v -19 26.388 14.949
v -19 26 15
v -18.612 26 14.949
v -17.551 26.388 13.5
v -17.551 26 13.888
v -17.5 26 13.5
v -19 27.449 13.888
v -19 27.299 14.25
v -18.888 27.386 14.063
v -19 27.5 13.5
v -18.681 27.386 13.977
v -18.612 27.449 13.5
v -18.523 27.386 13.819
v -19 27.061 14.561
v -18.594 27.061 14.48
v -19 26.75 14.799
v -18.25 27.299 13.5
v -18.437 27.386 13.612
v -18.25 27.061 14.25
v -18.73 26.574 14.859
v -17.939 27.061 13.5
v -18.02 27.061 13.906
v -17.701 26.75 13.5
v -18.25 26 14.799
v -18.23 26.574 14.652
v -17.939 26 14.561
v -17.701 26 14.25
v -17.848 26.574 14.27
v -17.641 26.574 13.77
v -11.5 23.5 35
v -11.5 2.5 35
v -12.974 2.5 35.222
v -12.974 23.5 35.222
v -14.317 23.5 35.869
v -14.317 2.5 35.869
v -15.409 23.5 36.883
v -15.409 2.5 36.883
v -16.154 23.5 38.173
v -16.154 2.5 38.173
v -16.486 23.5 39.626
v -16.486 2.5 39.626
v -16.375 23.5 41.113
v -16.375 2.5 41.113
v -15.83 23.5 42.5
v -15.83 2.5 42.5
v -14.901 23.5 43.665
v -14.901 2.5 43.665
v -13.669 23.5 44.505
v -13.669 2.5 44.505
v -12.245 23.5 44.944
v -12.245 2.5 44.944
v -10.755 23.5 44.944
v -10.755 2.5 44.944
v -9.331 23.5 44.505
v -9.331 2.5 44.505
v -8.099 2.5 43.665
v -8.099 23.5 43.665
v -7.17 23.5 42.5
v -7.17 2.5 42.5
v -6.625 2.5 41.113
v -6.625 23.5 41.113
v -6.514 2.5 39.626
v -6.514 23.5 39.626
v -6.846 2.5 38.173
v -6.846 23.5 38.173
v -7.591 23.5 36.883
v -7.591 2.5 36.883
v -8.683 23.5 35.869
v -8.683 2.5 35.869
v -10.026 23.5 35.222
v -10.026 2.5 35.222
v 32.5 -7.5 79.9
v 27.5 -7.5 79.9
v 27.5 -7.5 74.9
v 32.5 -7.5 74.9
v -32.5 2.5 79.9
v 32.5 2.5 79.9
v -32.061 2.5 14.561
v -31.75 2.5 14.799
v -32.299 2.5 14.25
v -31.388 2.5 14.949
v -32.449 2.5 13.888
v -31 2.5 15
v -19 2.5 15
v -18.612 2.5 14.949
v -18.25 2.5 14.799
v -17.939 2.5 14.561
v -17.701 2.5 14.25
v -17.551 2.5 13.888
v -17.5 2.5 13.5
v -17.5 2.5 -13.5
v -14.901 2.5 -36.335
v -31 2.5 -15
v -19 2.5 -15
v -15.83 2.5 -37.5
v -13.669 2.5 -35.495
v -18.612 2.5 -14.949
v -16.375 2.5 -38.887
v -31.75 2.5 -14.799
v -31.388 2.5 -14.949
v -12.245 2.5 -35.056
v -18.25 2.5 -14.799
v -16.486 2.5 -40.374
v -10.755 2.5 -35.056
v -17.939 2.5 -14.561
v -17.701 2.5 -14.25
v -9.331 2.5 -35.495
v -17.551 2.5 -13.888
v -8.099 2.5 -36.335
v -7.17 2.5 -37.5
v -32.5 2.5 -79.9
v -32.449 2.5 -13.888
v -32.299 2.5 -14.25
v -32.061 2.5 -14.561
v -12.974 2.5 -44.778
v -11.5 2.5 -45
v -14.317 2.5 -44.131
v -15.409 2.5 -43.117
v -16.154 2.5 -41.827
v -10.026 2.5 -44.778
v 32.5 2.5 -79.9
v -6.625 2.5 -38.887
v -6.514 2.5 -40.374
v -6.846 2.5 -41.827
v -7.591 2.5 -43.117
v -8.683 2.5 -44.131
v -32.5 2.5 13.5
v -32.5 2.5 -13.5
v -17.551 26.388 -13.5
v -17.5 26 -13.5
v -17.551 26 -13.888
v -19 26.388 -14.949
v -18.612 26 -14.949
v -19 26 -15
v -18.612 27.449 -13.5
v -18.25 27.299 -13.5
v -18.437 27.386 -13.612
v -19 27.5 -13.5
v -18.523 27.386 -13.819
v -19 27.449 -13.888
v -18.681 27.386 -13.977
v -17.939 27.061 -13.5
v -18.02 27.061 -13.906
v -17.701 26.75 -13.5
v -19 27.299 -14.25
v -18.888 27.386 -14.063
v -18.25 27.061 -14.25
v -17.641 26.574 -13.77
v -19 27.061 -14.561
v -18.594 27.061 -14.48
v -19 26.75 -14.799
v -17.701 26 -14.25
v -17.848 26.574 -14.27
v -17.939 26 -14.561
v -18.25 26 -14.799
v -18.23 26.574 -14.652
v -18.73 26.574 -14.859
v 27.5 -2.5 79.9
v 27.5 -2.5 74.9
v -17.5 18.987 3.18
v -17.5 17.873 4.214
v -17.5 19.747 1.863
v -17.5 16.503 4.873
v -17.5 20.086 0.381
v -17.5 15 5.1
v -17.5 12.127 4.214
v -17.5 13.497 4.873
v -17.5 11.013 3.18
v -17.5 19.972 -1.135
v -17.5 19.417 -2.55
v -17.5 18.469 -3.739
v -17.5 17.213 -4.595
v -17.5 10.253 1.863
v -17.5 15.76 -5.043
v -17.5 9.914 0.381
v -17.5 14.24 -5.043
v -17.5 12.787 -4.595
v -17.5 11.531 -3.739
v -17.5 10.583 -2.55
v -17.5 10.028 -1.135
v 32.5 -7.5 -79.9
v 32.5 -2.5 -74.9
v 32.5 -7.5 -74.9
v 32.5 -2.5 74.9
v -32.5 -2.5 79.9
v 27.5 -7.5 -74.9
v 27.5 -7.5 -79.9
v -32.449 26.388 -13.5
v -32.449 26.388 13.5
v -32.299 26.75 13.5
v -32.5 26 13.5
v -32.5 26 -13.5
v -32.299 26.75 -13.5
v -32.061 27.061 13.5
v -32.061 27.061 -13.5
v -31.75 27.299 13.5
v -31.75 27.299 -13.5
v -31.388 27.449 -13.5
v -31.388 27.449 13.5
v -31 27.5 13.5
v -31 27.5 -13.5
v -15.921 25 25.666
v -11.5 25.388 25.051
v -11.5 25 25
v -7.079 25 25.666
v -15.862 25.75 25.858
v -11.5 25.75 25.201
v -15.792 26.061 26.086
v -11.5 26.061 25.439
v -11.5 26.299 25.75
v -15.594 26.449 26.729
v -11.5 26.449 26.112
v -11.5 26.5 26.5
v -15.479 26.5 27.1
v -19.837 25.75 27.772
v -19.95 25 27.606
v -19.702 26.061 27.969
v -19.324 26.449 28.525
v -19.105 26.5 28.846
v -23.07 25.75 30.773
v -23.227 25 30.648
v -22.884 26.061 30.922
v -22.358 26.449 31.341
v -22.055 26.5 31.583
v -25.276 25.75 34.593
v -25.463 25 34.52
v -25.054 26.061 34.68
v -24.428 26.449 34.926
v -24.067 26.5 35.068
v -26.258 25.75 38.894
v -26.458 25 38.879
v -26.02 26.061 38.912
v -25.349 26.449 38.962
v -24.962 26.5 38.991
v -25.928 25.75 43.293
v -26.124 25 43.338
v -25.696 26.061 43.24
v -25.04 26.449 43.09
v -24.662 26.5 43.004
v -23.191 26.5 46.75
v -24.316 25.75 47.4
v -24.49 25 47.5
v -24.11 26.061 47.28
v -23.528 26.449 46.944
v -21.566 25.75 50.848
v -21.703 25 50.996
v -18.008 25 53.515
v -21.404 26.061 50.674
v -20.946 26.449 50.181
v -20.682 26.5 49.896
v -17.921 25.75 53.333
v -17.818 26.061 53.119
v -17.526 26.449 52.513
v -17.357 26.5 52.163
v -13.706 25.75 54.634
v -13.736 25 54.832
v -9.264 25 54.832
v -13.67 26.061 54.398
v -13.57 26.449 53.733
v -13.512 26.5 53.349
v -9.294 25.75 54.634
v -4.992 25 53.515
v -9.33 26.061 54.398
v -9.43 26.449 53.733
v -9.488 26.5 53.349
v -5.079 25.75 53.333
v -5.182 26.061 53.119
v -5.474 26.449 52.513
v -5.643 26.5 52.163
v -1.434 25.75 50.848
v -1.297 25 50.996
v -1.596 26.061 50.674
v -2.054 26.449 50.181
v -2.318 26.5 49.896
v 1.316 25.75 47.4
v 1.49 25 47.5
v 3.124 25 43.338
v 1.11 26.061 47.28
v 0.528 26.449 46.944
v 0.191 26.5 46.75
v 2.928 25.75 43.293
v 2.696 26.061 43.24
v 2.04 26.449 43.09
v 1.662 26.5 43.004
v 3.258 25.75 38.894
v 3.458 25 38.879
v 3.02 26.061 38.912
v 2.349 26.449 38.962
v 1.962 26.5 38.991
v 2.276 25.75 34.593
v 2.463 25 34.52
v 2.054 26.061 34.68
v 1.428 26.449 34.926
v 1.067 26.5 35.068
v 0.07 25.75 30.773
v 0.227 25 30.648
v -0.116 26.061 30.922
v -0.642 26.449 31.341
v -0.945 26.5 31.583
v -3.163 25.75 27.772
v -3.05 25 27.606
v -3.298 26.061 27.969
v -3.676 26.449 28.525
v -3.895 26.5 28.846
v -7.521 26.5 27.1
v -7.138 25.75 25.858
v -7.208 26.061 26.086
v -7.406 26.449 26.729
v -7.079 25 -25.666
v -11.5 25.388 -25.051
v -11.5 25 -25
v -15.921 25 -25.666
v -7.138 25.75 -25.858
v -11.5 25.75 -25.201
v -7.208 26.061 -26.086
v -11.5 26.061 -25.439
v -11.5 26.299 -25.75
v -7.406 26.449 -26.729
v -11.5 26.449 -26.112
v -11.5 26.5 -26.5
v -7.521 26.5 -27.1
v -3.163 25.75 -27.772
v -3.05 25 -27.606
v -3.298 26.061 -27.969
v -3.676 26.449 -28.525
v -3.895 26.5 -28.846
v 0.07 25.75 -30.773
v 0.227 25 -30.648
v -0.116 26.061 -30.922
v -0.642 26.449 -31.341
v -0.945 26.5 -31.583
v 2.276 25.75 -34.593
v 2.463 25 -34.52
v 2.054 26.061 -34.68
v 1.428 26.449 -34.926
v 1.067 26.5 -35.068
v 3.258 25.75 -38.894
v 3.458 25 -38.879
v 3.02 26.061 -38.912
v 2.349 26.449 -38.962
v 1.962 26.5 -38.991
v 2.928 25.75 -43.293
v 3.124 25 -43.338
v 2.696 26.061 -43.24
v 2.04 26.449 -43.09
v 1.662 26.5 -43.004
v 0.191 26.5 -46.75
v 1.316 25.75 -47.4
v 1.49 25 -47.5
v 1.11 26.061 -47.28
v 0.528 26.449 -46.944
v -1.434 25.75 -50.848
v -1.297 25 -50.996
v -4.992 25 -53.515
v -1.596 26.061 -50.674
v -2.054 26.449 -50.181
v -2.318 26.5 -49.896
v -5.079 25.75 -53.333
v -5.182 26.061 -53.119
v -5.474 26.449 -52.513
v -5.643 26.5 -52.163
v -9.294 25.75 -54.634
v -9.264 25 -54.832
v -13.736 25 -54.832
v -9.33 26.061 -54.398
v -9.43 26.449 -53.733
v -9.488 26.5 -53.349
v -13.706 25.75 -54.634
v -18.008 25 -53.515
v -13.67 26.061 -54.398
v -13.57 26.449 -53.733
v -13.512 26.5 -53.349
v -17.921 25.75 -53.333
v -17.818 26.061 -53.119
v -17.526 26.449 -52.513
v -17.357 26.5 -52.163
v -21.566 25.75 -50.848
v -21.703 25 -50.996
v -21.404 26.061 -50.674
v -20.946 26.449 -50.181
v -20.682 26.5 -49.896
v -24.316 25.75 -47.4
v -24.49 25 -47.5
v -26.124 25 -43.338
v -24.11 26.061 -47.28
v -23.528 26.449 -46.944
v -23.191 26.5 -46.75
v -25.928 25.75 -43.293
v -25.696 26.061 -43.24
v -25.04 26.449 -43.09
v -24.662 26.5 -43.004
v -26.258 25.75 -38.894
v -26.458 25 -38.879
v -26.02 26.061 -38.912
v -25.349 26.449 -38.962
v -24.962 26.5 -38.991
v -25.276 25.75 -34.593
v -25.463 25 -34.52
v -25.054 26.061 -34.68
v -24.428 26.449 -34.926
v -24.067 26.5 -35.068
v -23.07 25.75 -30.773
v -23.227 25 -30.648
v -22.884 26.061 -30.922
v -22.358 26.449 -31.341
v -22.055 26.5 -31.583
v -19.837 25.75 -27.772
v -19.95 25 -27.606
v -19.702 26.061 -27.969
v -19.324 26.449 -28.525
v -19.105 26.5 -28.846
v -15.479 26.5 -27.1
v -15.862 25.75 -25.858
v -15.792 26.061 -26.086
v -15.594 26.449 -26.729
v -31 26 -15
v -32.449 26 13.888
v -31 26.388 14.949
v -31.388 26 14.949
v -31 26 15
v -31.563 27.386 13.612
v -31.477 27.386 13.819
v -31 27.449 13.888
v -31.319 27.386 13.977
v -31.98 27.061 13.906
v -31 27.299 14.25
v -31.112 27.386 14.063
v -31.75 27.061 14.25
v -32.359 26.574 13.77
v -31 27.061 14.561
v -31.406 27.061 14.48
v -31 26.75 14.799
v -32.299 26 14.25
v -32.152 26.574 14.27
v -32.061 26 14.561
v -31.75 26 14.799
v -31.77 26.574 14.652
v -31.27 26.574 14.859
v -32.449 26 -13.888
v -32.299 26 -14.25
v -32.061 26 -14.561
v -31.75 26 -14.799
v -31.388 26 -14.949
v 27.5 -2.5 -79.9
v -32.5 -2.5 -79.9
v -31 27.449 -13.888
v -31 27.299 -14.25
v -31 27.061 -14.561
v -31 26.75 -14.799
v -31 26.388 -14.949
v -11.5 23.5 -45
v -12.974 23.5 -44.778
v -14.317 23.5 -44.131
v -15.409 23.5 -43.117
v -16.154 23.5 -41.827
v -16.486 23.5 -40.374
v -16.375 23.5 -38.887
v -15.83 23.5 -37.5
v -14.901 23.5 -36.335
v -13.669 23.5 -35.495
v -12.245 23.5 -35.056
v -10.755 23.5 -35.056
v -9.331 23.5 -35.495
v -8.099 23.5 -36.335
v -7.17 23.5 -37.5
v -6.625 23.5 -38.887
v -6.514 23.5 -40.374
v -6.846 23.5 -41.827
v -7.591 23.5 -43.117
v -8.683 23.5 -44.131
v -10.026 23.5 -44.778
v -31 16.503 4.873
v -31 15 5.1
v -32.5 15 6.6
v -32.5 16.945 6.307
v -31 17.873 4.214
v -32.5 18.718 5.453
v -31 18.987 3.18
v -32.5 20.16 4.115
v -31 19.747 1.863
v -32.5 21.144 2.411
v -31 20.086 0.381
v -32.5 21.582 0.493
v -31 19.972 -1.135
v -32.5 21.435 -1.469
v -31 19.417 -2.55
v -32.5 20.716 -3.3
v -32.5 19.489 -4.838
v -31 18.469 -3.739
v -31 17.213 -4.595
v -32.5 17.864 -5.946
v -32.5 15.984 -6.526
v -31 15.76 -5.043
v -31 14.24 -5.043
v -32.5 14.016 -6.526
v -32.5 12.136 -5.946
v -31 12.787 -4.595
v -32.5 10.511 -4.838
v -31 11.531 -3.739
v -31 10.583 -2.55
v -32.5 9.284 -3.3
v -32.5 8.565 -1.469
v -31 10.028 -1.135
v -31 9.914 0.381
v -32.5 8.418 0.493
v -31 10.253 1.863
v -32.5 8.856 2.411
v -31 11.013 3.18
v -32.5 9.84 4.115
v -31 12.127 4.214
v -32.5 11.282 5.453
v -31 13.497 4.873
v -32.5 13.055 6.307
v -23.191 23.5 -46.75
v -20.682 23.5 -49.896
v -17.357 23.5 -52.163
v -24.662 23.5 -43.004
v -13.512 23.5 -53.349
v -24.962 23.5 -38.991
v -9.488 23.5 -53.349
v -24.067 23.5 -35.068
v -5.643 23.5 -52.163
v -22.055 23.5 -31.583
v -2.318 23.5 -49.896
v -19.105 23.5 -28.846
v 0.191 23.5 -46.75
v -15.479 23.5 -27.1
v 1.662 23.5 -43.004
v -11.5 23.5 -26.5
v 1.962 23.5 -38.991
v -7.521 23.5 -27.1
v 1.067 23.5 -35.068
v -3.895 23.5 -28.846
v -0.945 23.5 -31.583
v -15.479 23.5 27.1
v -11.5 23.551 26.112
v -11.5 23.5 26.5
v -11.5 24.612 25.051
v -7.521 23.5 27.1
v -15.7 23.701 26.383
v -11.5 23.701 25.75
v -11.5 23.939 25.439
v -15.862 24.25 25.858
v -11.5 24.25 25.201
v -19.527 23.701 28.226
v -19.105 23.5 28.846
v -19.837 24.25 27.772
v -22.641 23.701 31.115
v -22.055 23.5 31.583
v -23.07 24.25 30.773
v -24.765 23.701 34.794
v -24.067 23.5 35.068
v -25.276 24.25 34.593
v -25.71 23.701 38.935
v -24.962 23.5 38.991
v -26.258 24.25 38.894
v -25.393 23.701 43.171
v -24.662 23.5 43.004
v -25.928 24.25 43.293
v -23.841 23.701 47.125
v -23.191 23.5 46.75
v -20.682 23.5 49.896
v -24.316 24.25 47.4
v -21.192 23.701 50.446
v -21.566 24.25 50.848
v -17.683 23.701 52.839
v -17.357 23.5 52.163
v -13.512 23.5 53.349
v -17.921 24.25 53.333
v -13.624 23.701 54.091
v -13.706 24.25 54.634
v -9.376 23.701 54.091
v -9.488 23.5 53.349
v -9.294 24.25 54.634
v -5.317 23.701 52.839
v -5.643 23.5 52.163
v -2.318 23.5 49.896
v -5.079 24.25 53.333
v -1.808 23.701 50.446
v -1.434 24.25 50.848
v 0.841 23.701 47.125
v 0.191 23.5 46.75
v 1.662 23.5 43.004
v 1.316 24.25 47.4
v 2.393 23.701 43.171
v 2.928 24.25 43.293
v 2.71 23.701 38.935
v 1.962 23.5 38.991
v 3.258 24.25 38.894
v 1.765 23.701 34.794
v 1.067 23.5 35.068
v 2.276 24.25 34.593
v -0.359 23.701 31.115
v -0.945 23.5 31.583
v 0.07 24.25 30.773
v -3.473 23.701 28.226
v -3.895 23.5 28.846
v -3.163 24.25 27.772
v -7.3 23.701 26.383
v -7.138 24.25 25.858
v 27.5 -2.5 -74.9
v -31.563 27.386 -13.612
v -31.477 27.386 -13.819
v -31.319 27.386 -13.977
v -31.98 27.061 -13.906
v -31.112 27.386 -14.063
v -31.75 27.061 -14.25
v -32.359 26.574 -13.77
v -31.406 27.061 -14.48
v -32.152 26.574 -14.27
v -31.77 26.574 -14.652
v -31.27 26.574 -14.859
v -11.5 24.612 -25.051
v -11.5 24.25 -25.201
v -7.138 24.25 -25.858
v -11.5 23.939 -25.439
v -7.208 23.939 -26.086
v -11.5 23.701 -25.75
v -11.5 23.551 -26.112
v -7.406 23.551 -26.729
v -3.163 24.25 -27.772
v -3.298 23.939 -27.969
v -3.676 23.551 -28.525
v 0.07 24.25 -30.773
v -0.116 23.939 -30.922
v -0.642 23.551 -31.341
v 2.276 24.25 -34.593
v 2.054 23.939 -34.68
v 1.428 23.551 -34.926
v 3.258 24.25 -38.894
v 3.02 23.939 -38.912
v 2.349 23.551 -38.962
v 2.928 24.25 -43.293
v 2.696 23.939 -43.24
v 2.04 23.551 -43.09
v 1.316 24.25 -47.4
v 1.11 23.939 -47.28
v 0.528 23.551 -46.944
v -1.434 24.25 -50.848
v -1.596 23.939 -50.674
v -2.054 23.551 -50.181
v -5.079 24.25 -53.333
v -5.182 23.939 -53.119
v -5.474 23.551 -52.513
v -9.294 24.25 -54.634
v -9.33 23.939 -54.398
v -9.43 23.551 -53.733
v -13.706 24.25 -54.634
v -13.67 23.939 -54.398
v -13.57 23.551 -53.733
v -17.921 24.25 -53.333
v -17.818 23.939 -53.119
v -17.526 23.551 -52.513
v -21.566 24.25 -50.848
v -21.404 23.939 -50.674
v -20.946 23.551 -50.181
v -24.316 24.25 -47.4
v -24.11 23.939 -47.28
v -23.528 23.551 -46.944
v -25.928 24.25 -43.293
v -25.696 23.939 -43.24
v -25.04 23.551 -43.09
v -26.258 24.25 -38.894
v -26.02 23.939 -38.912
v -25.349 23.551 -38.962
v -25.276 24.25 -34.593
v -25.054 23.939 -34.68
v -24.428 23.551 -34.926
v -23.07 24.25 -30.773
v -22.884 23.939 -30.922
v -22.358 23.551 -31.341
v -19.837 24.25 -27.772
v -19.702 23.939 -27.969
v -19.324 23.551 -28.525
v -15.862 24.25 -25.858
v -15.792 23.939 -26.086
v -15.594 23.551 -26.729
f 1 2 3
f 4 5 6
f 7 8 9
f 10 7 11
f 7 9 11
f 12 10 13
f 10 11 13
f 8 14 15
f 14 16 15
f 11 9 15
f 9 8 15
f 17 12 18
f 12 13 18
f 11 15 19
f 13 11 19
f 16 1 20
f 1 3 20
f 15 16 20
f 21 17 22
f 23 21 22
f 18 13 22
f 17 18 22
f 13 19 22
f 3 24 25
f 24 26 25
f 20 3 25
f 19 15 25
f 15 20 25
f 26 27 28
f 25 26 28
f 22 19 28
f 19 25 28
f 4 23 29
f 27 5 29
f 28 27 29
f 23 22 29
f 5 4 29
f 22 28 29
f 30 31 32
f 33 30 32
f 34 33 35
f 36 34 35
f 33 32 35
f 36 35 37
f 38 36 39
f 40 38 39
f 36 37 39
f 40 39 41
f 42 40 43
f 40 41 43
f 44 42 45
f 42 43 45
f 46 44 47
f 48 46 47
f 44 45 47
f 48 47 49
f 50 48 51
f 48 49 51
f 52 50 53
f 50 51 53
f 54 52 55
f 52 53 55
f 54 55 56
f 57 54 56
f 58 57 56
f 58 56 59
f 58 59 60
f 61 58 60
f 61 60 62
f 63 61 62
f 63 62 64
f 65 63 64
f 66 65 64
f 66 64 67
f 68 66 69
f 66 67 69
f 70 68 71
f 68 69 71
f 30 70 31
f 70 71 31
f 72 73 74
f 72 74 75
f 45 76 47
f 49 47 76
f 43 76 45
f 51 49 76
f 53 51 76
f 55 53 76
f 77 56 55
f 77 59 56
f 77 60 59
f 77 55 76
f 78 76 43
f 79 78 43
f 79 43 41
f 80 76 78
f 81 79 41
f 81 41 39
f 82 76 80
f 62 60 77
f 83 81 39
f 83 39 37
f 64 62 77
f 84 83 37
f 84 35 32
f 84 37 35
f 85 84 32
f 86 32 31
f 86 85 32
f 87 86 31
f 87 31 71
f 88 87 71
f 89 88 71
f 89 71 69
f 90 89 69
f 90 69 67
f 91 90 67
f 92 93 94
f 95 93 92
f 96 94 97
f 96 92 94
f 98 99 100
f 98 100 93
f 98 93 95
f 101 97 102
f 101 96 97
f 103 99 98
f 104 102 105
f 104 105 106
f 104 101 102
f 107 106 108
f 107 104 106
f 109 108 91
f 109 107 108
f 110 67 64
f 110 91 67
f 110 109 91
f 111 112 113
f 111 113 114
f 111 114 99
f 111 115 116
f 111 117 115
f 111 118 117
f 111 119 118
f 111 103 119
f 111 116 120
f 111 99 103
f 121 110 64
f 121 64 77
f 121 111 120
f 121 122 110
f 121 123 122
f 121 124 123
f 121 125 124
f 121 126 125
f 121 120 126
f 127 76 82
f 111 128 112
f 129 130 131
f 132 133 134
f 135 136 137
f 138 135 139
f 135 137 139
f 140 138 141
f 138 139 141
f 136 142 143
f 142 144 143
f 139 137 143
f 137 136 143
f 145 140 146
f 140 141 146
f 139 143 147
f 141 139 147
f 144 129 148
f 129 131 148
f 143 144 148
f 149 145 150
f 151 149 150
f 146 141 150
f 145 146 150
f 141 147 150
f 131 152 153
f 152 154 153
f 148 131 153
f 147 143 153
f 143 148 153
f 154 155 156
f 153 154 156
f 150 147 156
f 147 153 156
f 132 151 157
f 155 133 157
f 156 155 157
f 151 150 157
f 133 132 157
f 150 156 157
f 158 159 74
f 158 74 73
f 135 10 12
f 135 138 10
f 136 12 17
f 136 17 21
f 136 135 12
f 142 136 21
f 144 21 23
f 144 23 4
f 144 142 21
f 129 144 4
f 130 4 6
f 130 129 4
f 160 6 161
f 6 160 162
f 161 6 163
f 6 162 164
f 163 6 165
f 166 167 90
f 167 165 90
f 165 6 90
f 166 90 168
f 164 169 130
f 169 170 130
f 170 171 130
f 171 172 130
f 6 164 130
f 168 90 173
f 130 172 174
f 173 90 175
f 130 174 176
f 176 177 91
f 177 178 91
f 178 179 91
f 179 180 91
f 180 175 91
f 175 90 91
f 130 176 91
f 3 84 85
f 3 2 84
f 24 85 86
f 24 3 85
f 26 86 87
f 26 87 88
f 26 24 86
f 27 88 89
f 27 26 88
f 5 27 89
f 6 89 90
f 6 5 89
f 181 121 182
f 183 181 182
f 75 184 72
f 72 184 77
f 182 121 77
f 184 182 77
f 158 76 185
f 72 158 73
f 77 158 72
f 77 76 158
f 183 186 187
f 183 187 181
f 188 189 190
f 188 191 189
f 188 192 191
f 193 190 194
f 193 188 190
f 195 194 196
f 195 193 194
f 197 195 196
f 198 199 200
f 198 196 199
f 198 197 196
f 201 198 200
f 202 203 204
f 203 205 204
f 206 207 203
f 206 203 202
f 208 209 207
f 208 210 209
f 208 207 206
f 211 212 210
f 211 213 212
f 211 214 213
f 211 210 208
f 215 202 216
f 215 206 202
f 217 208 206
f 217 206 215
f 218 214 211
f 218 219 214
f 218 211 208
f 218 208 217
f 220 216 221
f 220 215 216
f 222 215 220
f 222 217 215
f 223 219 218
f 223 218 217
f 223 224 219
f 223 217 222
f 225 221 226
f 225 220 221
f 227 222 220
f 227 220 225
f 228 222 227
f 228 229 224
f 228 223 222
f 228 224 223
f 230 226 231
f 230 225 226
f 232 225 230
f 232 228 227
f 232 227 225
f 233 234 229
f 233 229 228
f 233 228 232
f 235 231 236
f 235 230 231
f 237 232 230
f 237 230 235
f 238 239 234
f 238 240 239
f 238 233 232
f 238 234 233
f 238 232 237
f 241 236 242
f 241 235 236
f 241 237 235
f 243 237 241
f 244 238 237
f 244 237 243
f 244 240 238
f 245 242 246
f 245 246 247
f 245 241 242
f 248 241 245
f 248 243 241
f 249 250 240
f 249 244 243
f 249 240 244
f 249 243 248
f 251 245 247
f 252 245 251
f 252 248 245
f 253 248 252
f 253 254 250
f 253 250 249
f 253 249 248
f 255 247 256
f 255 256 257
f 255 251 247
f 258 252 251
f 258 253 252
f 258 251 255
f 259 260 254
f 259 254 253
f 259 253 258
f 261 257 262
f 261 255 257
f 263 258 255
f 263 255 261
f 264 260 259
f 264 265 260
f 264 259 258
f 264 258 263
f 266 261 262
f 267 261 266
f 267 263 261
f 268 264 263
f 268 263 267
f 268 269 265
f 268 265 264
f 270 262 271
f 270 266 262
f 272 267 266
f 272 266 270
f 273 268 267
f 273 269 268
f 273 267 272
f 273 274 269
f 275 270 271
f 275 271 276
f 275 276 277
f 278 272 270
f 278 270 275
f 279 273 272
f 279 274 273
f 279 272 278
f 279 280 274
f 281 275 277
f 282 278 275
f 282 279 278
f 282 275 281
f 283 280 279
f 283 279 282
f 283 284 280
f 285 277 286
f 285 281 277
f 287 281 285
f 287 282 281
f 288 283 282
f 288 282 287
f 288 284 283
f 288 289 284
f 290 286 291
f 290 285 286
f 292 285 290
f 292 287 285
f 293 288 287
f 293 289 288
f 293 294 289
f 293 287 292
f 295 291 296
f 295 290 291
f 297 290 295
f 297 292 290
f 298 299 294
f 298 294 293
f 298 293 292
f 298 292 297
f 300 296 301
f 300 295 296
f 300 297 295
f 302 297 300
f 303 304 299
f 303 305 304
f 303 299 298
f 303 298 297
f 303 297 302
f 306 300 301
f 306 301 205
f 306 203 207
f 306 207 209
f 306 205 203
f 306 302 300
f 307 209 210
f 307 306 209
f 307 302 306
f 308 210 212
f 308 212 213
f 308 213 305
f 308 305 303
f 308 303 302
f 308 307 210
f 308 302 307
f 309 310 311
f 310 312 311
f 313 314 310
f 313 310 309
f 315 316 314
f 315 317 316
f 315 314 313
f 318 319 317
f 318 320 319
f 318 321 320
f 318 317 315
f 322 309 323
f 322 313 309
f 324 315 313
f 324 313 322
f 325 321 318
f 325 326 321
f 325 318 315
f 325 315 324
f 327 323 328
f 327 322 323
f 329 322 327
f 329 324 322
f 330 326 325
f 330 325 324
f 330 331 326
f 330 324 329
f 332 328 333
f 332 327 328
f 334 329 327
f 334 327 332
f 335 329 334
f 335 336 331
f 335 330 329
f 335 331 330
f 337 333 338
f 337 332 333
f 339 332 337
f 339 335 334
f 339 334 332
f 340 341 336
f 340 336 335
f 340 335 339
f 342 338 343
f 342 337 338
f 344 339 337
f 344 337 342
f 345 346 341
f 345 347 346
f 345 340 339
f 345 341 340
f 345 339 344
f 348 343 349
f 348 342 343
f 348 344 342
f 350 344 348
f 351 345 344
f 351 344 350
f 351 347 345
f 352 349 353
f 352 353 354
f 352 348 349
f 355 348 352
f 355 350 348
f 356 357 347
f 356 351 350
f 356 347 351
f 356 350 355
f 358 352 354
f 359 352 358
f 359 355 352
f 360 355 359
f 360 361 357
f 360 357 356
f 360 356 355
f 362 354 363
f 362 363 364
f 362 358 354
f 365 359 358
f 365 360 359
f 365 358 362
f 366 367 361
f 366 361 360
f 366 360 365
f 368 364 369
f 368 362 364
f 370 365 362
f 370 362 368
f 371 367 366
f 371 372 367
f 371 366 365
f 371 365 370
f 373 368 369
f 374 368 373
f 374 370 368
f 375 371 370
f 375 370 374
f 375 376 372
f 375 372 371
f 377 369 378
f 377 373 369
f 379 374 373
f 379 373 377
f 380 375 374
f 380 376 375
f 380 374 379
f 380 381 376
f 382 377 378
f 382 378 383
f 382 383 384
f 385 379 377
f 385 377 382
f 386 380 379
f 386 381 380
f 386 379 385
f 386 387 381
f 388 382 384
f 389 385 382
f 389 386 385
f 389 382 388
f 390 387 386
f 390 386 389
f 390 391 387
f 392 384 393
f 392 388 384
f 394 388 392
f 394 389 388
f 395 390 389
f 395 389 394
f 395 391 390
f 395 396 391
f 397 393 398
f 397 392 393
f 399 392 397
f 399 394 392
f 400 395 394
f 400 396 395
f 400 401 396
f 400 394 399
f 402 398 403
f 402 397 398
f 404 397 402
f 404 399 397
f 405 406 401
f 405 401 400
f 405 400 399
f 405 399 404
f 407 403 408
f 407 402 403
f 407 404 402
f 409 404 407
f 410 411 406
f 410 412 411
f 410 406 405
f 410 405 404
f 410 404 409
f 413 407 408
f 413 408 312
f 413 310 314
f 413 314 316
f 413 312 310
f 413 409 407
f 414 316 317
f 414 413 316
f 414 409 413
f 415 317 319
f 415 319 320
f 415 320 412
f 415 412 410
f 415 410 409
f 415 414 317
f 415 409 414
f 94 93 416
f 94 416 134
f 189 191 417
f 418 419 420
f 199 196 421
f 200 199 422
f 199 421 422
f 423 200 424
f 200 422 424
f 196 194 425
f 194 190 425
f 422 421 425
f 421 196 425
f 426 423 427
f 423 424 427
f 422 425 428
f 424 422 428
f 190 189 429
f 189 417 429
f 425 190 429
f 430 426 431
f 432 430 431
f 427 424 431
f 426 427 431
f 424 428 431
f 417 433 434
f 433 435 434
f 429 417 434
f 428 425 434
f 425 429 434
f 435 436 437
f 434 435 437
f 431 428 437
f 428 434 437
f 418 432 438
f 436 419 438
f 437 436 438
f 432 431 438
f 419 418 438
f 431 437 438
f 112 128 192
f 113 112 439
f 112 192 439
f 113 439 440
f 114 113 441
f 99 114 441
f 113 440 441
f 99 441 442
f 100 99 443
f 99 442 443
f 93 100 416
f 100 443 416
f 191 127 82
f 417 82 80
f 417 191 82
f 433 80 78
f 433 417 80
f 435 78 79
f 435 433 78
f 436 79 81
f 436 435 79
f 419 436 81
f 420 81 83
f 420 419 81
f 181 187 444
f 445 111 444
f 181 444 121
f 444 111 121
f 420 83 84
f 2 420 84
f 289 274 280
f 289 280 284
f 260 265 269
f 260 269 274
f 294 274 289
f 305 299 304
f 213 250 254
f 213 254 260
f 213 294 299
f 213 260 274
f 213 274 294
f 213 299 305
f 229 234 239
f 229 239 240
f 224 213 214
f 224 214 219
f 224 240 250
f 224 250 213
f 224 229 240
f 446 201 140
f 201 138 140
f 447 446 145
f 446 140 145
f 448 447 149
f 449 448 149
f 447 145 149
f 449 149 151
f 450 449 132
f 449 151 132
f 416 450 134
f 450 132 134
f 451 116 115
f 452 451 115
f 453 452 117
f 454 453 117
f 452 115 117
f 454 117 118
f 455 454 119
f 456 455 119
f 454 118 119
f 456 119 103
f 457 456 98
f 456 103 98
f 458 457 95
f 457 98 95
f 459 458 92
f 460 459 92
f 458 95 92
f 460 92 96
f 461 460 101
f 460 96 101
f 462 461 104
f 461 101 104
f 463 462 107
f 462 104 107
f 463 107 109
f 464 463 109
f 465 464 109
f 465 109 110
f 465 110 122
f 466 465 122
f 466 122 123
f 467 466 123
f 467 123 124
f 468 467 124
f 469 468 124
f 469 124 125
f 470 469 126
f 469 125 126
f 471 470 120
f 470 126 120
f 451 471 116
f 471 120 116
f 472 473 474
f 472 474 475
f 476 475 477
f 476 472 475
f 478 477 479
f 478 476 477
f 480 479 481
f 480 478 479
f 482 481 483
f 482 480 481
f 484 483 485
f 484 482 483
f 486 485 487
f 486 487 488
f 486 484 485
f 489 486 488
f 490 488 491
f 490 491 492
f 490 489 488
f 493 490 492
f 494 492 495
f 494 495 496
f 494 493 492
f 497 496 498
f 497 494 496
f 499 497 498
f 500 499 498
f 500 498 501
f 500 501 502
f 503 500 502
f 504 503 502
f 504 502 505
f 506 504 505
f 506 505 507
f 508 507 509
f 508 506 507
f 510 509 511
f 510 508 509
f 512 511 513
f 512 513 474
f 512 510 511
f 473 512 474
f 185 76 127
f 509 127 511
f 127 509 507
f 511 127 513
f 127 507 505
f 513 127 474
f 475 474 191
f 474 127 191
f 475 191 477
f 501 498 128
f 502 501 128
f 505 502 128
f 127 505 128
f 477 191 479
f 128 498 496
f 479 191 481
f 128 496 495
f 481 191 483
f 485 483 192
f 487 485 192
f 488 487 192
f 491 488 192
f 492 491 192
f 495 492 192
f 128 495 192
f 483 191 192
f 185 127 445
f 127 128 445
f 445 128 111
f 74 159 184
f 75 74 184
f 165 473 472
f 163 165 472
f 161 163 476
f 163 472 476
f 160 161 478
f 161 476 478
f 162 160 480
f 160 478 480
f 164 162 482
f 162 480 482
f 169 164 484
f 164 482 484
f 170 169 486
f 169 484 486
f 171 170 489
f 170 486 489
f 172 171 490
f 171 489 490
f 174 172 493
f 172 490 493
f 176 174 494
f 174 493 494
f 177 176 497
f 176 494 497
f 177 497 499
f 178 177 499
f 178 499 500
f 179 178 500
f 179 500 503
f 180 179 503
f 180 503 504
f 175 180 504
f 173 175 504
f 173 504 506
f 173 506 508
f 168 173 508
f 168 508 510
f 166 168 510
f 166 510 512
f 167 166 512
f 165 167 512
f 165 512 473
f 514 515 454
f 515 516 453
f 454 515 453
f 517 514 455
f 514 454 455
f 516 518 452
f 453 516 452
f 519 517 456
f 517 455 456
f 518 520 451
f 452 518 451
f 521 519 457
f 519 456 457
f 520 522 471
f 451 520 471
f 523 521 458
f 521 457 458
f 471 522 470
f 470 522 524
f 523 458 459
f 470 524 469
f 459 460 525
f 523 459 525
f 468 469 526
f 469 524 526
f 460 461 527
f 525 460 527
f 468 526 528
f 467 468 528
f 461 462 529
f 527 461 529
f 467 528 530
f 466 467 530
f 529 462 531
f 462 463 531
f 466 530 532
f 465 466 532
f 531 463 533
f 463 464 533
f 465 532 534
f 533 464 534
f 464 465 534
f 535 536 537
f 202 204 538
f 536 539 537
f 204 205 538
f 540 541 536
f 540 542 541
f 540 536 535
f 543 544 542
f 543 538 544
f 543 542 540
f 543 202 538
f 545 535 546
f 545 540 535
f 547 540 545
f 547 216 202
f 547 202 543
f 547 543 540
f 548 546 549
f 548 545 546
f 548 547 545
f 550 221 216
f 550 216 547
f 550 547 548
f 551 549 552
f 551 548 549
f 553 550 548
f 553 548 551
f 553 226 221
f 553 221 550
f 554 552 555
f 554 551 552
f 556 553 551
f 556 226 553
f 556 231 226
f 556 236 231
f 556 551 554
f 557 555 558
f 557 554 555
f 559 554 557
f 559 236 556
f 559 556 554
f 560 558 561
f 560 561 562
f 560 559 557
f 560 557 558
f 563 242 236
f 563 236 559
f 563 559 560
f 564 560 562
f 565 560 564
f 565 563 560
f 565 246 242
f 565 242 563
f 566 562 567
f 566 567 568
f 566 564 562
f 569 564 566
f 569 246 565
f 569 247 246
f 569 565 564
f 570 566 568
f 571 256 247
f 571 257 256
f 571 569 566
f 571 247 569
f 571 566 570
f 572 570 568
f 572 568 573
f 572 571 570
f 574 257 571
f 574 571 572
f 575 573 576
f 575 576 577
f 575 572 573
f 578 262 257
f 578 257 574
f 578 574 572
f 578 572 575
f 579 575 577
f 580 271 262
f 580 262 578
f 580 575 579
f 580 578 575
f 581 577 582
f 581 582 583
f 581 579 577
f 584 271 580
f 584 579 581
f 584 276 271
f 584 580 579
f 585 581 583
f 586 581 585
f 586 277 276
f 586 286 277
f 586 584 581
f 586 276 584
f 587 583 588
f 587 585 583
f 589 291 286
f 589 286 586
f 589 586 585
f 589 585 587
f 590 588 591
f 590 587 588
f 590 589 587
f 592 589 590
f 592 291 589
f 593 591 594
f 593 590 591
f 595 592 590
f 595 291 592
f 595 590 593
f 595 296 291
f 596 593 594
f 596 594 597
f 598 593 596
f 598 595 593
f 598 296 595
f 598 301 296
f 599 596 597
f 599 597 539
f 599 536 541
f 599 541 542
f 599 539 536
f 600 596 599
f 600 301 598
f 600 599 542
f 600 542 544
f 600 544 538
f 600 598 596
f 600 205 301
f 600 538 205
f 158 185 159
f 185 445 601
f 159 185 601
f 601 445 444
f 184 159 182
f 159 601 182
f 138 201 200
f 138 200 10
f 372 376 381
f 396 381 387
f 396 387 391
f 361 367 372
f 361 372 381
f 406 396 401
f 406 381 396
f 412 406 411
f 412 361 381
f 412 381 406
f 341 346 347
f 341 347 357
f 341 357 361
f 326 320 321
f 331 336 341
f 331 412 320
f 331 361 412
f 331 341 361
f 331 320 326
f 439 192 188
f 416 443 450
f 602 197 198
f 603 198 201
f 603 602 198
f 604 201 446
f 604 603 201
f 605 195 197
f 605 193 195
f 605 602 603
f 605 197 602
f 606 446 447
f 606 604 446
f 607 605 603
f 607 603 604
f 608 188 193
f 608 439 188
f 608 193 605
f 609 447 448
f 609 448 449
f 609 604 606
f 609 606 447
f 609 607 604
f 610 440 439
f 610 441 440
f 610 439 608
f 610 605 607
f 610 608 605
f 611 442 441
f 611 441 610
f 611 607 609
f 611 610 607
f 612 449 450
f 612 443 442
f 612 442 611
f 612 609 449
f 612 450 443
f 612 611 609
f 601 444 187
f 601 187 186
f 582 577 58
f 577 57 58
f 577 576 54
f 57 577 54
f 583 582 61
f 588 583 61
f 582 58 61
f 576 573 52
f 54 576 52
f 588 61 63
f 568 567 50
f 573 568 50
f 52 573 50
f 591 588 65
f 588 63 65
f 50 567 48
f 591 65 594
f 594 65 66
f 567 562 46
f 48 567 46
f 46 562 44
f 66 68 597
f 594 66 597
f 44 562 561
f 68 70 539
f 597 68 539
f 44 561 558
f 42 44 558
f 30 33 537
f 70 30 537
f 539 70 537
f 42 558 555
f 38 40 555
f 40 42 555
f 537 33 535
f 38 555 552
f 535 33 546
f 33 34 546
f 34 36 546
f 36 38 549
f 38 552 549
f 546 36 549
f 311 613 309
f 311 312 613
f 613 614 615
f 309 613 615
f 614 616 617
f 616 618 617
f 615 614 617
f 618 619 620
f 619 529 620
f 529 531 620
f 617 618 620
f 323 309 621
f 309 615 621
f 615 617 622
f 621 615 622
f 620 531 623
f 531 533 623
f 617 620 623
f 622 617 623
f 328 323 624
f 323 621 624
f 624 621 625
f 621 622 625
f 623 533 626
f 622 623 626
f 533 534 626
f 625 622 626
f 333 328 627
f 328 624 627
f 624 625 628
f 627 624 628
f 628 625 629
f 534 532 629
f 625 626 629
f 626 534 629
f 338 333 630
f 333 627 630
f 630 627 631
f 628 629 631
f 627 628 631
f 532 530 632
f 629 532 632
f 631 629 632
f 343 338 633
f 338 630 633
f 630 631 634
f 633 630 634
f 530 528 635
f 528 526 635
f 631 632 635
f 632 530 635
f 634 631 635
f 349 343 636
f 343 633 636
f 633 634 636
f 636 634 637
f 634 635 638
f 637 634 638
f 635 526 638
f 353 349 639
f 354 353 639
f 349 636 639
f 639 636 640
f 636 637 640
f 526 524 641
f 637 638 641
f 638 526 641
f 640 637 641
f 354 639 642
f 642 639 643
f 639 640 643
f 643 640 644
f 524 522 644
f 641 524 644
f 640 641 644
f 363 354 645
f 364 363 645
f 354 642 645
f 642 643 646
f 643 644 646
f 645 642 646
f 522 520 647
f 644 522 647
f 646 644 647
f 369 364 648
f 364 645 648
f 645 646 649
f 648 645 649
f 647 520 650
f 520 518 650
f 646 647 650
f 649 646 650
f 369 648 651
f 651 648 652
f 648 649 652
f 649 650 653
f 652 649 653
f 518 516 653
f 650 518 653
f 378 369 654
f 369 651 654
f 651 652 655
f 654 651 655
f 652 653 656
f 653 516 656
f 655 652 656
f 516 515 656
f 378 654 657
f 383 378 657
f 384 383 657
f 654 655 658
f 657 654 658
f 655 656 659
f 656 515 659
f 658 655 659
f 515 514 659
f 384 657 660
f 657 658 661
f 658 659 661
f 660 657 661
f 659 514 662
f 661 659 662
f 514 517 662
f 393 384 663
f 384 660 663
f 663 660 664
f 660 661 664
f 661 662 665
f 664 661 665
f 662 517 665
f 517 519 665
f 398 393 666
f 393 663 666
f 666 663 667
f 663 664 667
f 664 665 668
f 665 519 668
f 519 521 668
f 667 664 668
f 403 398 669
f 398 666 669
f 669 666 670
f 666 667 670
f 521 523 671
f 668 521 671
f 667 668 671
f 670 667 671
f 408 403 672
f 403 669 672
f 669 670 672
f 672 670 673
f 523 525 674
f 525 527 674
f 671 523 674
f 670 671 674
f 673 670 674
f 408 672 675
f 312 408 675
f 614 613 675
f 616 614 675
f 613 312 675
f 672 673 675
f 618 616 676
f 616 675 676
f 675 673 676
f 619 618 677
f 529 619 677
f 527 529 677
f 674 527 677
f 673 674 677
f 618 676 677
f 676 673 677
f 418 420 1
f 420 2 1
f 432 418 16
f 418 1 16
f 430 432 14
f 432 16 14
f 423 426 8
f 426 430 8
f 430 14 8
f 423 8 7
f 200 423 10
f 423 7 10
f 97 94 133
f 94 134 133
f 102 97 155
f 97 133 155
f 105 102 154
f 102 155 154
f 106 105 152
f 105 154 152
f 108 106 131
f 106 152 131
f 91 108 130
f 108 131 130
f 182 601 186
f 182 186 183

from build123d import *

# Parameters (mm, degrees)
SKETCH1_W           = 65
SKETCH1_H           = 159.8
BOSS_EXTRUDE1_DEPTH = 2.5
SKETCH2_W           = 15
SKETCH2_H           = 30
BOSS_EXTRUDE2_DEPTH = 25
SKETCH3_R           = 5.1
CUT_EXTRUDE1_DEPTH  = 107.607973435
SKETCH6_W           = 5
SKETCH6_H           = 5
BOSS_EXTRUDE4_DEPTH = 5
SKETCH7_R           = 5
BOSS_EXTRUDE5_DEPTH = 21
SKETCH8_R           = 15
BOSS_EXTRUDE6_DEPTH = 3
FILLET1_R           = 1.5
CHAMFER1_SIZE       = 1.5
FILLET2_R           = 1.5


with BuildPart() as part:
    # Sketch1 → Boss-Extrude1 (new, symmetric)
    with BuildSketch(Plane(origin=(0, 0, 0), x_dir=(1, 0, 0), z_dir=(0, 1, 0))):
        Rectangle(SKETCH1_W, SKETCH1_H)
    extrude(amount=BOSS_EXTRUDE1_DEPTH, both=True)

    # Sketch2 → Boss-Extrude2 (add)
    with BuildSketch(Plane(origin=(0, 2.5, 0), x_dir=(1, 0, 0), z_dir=(0, 1, 0))):
        with Locations((-25, 0)):
            Rectangle(SKETCH2_W, SKETCH2_H)
    extrude(amount=BOSS_EXTRUDE2_DEPTH)

    # Sketch3 → Cut-Extrude1 (cut, through all)
    with BuildSketch(Plane.ZY.offset(32.5)):
        with Locations((0, 15)):
            Circle(SKETCH3_R)
    extrude(amount=-CUT_EXTRUDE1_DEPTH, mode=Mode.SUBTRACT)

    # Sketch6 → Boss-Extrude4 (add)
    with BuildSketch(Plane.XZ.offset(2.5)):
        with Locations((30, 77.4)):
            Rectangle(SKETCH6_W, SKETCH6_H)
        with Locations((30, -77.4)):
            Rectangle(SKETCH6_W, SKETCH6_H)
    extrude(amount=BOSS_EXTRUDE4_DEPTH)

    # Sketch7 → Boss-Extrude5 (add)
    with BuildSketch(Plane(origin=(0, 2.5, 0), x_dir=(1, 0, 0), z_dir=(0, 1, 0))):
        with Locations(Location((-11.5, 40, 0), (0, 0, 90))):
            Circle(SKETCH7_R)
        with Locations(Location((-11.5, -40, 0), (0, 0, 90))):
            Circle(SKETCH7_R)
    extrude(amount=BOSS_EXTRUDE5_DEPTH)

    # Sketch8 → Boss-Extrude6 (add)
    with BuildSketch(Plane(origin=(0, 23.5, 0), x_dir=(1, 0, 0), z_dir=(0, 1, 0))):
        with Locations(Location((-11.5, 40, 0), (0, 0, 270))):
            Circle(SKETCH8_R)
        with Locations(Location((-11.5, -40, 0), (0, 0, 90))):
            Circle(SKETCH8_R)
    extrude(amount=BOSS_EXTRUDE6_DEPTH)

    # Fillet1
    fillet1_edges = [part.edges().sort_by_distance(p)[0] for p in [
        (-11.5, 23.5, -55),
        (-11.5, 26.5, -55),
        (-11.5, 23.5, 55),
        (-11.5, 26.5, 55),
    ]]
    fillet(fillet1_edges, radius=FILLET1_R - 0.0001)  # a hair under: the kernel refuses the full size

    # Chamfer1
    chamfer1_edges = [part.edges().sort_by_distance(p)[0] for p in [
        (-32.5, 15, -5.1),
    ]]
    chamfer(chamfer1_edges, length=CHAMFER1_SIZE)

    # Fillet2
    fillet2_edges = [part.edges().sort_by_distance(p)[0] for p in [
        (-32.5, 15, -15),
        (-32.5, 15, 15),
        (-17.5, 15, 15),
        (-17.5, 15, -15),
        (-32.5, 27.5, 0),
        (-25, 27.5, 15),
        (-17.5, 27.5, 0),
        (-25, 27.5, -15),
    ]]
    fillet(fillet2_edges, radius=FILLET2_R)


solid = part.part
